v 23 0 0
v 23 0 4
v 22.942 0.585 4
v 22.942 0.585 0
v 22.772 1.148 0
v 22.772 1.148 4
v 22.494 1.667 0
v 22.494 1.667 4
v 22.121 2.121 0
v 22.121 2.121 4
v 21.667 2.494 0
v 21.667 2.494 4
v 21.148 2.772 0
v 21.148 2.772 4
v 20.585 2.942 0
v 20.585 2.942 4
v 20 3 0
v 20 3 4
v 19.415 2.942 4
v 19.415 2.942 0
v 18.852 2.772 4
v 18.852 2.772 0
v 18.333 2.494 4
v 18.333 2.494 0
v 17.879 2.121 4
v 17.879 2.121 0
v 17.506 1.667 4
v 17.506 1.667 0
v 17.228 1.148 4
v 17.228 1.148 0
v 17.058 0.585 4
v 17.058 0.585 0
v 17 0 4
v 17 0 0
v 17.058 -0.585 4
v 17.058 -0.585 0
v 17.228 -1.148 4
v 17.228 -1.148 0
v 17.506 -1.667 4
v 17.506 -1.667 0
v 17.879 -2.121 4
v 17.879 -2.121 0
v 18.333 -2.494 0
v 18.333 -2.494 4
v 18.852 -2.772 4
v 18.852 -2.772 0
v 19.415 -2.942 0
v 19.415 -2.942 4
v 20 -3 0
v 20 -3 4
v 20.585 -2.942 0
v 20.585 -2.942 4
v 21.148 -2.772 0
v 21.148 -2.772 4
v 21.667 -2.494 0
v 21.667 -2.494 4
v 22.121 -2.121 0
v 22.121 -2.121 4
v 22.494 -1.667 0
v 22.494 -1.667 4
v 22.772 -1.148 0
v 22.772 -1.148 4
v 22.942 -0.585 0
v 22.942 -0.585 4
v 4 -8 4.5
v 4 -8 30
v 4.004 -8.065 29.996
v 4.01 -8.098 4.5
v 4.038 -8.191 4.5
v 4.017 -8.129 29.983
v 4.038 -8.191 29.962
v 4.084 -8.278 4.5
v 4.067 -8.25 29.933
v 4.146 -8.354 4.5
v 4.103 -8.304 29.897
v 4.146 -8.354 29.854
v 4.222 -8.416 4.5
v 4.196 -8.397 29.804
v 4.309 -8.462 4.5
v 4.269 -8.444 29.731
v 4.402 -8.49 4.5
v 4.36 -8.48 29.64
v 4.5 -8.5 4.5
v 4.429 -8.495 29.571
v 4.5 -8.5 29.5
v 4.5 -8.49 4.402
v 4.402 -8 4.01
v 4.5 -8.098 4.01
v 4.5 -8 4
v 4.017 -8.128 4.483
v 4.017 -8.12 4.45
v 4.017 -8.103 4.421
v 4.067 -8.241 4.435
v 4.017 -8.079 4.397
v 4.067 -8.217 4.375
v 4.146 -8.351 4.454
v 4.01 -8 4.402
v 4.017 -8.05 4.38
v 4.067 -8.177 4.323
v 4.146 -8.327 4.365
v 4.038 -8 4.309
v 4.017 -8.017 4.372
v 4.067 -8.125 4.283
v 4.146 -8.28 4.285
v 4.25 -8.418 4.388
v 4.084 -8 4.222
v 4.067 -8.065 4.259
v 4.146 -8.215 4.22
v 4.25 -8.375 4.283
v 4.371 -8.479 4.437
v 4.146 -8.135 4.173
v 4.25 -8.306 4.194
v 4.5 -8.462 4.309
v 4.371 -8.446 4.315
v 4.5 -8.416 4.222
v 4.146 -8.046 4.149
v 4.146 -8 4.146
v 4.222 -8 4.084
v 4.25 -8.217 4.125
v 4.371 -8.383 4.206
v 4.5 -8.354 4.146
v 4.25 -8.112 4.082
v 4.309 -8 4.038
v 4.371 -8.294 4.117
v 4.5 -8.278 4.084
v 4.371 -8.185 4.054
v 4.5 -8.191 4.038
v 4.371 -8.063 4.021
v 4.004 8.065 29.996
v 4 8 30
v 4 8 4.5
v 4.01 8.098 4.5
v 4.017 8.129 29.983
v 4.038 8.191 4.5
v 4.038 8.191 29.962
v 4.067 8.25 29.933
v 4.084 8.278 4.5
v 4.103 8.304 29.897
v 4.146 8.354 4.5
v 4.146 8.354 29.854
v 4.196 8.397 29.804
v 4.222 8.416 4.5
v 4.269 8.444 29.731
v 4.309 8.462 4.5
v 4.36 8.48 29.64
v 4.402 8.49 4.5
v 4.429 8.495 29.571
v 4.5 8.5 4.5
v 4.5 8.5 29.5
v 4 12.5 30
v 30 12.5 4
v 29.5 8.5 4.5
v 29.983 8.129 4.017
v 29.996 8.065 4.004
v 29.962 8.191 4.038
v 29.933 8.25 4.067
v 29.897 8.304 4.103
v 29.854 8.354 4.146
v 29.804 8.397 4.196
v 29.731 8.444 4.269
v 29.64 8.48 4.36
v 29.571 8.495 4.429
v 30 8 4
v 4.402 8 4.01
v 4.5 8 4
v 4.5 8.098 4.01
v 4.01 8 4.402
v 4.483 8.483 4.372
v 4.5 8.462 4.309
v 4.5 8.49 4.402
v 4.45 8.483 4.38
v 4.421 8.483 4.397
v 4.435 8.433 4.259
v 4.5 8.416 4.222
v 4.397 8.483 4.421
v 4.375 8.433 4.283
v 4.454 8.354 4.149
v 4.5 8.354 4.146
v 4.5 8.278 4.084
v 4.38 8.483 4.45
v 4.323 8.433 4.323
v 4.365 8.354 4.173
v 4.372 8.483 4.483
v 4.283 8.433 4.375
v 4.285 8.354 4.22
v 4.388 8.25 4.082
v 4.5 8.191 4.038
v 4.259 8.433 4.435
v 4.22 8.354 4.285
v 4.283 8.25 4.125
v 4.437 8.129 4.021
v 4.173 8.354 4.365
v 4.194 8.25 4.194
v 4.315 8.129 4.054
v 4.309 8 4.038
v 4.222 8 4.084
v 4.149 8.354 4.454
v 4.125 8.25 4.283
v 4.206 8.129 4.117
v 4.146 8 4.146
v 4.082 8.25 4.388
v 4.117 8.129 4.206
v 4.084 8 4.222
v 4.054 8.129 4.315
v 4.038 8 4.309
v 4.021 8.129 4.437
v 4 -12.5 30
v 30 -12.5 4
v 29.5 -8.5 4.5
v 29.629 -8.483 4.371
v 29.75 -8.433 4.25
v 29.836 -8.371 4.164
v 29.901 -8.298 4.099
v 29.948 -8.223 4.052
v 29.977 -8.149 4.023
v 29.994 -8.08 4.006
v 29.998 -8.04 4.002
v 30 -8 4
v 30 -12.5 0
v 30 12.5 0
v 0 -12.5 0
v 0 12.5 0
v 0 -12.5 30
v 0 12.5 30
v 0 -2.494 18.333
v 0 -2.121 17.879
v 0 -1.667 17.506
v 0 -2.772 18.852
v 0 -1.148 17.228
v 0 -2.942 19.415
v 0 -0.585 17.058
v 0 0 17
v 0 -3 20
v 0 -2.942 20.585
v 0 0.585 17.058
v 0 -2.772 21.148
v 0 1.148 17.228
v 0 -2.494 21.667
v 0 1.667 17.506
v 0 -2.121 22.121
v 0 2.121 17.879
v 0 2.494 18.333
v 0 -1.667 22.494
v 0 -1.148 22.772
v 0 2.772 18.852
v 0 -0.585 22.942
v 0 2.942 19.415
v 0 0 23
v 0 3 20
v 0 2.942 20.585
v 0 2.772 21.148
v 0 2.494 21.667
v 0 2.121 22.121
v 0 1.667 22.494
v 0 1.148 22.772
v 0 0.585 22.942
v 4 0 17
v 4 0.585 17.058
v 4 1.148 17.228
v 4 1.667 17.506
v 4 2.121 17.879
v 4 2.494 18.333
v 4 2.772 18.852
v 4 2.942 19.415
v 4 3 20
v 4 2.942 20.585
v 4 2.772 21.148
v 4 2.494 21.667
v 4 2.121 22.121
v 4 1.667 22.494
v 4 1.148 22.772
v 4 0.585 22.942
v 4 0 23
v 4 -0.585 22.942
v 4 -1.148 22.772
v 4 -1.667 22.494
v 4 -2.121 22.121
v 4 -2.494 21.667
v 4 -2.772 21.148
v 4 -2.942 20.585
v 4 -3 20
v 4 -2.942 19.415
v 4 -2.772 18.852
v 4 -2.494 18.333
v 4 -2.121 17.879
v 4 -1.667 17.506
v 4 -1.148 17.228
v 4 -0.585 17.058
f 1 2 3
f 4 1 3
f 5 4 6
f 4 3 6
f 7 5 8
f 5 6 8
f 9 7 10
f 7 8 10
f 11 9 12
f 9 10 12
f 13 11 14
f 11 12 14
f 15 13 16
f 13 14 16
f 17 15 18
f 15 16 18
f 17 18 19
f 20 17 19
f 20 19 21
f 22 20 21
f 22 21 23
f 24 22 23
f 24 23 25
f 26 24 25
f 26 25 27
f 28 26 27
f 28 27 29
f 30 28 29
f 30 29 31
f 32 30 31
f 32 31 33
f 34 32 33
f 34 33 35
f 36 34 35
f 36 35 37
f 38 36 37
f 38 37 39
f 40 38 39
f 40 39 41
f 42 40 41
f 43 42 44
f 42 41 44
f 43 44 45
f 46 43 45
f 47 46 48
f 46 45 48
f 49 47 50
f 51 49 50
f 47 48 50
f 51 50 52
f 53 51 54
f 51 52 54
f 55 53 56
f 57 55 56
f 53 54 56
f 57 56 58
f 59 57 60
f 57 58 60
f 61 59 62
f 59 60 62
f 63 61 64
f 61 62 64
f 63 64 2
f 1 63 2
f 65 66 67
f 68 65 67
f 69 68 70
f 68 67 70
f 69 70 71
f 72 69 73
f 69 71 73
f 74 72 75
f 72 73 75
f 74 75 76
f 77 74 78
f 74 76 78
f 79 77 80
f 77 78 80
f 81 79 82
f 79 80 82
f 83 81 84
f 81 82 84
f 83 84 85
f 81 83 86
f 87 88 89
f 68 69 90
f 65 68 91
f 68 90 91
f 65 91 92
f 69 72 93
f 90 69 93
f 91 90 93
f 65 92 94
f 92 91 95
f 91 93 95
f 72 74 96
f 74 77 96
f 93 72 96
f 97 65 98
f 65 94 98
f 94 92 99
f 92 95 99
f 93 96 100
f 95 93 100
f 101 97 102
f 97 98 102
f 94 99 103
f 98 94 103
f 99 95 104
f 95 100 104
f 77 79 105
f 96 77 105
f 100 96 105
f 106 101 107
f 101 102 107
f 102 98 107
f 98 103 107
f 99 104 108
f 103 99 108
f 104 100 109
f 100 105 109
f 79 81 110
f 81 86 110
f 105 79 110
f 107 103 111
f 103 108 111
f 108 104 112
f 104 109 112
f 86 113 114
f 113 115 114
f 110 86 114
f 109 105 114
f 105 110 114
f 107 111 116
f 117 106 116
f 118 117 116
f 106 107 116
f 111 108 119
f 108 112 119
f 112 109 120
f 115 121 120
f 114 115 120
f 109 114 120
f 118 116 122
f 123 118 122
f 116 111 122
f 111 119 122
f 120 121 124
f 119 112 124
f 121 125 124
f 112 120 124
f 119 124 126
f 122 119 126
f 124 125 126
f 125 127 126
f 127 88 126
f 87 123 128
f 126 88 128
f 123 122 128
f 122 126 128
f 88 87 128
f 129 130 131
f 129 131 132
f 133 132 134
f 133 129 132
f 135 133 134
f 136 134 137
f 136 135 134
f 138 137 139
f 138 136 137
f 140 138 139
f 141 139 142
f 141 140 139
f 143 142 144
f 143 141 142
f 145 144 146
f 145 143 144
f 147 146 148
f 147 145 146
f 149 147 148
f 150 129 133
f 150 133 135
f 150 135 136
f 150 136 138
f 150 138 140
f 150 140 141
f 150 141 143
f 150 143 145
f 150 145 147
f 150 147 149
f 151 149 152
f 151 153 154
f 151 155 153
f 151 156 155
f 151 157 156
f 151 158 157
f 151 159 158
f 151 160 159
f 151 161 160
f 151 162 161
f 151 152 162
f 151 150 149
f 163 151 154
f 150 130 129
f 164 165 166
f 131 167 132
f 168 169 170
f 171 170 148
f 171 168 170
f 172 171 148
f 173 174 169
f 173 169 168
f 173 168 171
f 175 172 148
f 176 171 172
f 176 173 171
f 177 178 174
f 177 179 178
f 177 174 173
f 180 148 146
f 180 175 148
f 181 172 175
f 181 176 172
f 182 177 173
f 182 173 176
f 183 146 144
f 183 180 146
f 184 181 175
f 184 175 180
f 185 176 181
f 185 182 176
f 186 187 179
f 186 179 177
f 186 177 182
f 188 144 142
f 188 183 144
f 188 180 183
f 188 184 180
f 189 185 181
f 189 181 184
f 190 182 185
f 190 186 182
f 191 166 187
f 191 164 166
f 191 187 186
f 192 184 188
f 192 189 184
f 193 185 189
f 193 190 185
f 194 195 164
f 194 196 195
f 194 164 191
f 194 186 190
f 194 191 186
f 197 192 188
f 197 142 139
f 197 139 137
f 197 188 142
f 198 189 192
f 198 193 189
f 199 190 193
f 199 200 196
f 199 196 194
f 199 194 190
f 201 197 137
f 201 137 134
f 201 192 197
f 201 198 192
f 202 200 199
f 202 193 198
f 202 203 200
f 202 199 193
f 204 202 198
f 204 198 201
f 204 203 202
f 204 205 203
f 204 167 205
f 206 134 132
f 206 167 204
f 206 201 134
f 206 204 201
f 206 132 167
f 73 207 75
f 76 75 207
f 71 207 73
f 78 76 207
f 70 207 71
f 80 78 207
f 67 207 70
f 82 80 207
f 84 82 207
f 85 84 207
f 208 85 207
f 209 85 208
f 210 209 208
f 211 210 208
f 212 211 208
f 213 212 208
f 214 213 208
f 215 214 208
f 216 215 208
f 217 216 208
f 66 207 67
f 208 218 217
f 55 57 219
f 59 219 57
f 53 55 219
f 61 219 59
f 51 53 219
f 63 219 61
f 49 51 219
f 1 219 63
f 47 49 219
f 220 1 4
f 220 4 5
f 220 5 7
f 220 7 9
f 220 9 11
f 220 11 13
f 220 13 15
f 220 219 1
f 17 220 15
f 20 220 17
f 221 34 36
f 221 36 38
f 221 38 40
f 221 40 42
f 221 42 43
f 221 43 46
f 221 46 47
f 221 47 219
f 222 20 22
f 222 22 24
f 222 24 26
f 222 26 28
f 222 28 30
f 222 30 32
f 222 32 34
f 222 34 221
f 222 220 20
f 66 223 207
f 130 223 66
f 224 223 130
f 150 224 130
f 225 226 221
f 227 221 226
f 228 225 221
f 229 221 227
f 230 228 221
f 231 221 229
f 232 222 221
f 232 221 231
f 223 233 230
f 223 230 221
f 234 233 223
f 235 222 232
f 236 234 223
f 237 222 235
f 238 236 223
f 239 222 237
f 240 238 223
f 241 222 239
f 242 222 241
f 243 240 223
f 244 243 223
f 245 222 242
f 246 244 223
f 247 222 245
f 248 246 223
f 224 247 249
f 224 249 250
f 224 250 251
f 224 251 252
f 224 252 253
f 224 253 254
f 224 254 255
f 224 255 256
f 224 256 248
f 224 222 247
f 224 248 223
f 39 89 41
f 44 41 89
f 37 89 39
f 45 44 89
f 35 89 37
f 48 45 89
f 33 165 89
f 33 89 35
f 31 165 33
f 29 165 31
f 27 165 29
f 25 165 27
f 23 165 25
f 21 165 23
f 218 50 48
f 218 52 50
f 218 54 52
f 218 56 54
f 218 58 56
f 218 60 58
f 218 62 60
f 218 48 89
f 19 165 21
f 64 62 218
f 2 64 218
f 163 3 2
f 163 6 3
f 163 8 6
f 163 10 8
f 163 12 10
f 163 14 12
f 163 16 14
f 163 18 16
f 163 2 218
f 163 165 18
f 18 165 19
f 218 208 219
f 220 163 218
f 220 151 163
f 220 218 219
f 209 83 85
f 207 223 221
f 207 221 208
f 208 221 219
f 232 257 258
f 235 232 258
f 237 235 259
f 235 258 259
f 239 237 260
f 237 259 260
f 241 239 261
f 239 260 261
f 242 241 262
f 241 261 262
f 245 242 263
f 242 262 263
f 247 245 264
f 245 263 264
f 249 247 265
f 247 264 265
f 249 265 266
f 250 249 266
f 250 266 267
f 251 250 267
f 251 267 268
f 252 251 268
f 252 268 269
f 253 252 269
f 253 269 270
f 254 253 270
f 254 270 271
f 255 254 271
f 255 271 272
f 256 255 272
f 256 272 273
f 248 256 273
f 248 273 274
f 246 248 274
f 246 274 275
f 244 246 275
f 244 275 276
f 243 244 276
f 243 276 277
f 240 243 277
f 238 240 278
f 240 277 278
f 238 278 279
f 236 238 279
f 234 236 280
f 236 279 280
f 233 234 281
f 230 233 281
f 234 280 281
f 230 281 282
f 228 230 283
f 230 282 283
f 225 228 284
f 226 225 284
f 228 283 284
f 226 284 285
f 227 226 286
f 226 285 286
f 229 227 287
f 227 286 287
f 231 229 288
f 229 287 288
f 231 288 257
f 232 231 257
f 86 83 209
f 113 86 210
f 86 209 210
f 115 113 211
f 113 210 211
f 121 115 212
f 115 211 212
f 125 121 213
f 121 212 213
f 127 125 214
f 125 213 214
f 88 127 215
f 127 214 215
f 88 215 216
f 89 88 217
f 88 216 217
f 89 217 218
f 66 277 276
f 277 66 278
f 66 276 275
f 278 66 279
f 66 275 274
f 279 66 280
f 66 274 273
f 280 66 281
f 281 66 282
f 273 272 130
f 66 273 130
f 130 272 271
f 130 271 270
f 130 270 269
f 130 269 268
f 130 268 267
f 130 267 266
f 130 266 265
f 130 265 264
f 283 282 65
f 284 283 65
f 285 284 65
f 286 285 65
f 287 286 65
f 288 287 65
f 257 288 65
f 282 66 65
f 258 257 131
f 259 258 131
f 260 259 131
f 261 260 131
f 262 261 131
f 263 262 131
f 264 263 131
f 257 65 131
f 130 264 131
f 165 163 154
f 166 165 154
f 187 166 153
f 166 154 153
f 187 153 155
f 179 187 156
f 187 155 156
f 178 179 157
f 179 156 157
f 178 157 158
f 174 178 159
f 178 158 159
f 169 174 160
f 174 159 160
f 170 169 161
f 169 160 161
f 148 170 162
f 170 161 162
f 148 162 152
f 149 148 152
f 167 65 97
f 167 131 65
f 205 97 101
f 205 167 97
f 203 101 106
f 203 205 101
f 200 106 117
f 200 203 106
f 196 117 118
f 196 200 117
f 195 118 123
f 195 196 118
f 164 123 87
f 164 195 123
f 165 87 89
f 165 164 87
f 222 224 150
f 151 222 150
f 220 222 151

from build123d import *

# Parameters (mm, degrees)
DODANIE_WYCI_GNI_CIE1_DEPTH = 12.5
SKORUPA1_START              = 4
SKORUPA1_OUTLINE_W          = 27
SKORUPA1_OUTLINE_H          = 17
SKORUPA1_DEPTH              = 26
SZKIC2_R                    = 3
WYTNIJ_WYCI_GNI_CIE1_DEPTH  = 50
SZKIC3_R                    = 3
SZKIC3_R_2                  = 4
WYTNIJ_WYCI_GNI_CIE2_DEPTH  = 50
ZAOKR_GLENIE1_R             = 0.5


# Read off the part's stored shape, not the designer's step: Skorupa1
with BuildPart() as part:
    # Szkic1 → Dodanie-wyciągnięcie1 (new, symmetric)
    with BuildSketch(Plane(origin=(0, 0, 0), x_dir=(1, 0, 0), z_dir=(0, 1, 0))):
        Polygon((0, 0), (0, -30), (4, -30), (30, -4), (30, 0), align=None)
    extrude(amount=DODANIE_WYCI_GNI_CIE1_DEPTH, both=True)

    # Skorupa1 outline → Skorupa1 (cut)
    with BuildSketch(Plane.XY.offset(SKORUPA1_START)):
        with Locations((17.5, 0)):
            Rectangle(SKORUPA1_OUTLINE_W, SKORUPA1_OUTLINE_H)
    extrude(amount=SKORUPA1_DEPTH, mode=Mode.SUBTRACT)

    # Szkic2 → Wytnij-wyciągnięcie1 (cut)
    with BuildSketch(Plane(origin=(4, 0, 0), x_dir=(0, 0, -1), z_dir=(1, 0, 0))):
        with Locations((-20, 0)):
            Circle(SZKIC2_R)
    extrude(amount=-WYTNIJ_WYCI_GNI_CIE1_DEPTH, mode=Mode.SUBTRACT)

    # Szkic3 → Wytnij-wyciągnięcie2 (cut)
    with BuildSketch(Plane.XY.offset(4)):
        with Locations((20, 0)):
            Circle(SZKIC3_R)
        with Locations((18, 24.919871589)):
            Circle(SZKIC3_R_2)
    extrude(amount=-WYTNIJ_WYCI_GNI_CIE2_DEPTH, mode=Mode.SUBTRACT)

    # Zaokrąglenie1
    zaokr_glenie1_edges = [part.edges().sort_by_distance(p)[0] for p in [
        (17, -8.5, 4),
        (4, -8.5, 17),
        (4, 0, 4),
        (17, 8.5, 4),
        (4, 8.5, 17),
    ]]
    fillet(zaokr_glenie1_edges, radius=ZAOKR_GLENIE1_R)


solid = part.part
